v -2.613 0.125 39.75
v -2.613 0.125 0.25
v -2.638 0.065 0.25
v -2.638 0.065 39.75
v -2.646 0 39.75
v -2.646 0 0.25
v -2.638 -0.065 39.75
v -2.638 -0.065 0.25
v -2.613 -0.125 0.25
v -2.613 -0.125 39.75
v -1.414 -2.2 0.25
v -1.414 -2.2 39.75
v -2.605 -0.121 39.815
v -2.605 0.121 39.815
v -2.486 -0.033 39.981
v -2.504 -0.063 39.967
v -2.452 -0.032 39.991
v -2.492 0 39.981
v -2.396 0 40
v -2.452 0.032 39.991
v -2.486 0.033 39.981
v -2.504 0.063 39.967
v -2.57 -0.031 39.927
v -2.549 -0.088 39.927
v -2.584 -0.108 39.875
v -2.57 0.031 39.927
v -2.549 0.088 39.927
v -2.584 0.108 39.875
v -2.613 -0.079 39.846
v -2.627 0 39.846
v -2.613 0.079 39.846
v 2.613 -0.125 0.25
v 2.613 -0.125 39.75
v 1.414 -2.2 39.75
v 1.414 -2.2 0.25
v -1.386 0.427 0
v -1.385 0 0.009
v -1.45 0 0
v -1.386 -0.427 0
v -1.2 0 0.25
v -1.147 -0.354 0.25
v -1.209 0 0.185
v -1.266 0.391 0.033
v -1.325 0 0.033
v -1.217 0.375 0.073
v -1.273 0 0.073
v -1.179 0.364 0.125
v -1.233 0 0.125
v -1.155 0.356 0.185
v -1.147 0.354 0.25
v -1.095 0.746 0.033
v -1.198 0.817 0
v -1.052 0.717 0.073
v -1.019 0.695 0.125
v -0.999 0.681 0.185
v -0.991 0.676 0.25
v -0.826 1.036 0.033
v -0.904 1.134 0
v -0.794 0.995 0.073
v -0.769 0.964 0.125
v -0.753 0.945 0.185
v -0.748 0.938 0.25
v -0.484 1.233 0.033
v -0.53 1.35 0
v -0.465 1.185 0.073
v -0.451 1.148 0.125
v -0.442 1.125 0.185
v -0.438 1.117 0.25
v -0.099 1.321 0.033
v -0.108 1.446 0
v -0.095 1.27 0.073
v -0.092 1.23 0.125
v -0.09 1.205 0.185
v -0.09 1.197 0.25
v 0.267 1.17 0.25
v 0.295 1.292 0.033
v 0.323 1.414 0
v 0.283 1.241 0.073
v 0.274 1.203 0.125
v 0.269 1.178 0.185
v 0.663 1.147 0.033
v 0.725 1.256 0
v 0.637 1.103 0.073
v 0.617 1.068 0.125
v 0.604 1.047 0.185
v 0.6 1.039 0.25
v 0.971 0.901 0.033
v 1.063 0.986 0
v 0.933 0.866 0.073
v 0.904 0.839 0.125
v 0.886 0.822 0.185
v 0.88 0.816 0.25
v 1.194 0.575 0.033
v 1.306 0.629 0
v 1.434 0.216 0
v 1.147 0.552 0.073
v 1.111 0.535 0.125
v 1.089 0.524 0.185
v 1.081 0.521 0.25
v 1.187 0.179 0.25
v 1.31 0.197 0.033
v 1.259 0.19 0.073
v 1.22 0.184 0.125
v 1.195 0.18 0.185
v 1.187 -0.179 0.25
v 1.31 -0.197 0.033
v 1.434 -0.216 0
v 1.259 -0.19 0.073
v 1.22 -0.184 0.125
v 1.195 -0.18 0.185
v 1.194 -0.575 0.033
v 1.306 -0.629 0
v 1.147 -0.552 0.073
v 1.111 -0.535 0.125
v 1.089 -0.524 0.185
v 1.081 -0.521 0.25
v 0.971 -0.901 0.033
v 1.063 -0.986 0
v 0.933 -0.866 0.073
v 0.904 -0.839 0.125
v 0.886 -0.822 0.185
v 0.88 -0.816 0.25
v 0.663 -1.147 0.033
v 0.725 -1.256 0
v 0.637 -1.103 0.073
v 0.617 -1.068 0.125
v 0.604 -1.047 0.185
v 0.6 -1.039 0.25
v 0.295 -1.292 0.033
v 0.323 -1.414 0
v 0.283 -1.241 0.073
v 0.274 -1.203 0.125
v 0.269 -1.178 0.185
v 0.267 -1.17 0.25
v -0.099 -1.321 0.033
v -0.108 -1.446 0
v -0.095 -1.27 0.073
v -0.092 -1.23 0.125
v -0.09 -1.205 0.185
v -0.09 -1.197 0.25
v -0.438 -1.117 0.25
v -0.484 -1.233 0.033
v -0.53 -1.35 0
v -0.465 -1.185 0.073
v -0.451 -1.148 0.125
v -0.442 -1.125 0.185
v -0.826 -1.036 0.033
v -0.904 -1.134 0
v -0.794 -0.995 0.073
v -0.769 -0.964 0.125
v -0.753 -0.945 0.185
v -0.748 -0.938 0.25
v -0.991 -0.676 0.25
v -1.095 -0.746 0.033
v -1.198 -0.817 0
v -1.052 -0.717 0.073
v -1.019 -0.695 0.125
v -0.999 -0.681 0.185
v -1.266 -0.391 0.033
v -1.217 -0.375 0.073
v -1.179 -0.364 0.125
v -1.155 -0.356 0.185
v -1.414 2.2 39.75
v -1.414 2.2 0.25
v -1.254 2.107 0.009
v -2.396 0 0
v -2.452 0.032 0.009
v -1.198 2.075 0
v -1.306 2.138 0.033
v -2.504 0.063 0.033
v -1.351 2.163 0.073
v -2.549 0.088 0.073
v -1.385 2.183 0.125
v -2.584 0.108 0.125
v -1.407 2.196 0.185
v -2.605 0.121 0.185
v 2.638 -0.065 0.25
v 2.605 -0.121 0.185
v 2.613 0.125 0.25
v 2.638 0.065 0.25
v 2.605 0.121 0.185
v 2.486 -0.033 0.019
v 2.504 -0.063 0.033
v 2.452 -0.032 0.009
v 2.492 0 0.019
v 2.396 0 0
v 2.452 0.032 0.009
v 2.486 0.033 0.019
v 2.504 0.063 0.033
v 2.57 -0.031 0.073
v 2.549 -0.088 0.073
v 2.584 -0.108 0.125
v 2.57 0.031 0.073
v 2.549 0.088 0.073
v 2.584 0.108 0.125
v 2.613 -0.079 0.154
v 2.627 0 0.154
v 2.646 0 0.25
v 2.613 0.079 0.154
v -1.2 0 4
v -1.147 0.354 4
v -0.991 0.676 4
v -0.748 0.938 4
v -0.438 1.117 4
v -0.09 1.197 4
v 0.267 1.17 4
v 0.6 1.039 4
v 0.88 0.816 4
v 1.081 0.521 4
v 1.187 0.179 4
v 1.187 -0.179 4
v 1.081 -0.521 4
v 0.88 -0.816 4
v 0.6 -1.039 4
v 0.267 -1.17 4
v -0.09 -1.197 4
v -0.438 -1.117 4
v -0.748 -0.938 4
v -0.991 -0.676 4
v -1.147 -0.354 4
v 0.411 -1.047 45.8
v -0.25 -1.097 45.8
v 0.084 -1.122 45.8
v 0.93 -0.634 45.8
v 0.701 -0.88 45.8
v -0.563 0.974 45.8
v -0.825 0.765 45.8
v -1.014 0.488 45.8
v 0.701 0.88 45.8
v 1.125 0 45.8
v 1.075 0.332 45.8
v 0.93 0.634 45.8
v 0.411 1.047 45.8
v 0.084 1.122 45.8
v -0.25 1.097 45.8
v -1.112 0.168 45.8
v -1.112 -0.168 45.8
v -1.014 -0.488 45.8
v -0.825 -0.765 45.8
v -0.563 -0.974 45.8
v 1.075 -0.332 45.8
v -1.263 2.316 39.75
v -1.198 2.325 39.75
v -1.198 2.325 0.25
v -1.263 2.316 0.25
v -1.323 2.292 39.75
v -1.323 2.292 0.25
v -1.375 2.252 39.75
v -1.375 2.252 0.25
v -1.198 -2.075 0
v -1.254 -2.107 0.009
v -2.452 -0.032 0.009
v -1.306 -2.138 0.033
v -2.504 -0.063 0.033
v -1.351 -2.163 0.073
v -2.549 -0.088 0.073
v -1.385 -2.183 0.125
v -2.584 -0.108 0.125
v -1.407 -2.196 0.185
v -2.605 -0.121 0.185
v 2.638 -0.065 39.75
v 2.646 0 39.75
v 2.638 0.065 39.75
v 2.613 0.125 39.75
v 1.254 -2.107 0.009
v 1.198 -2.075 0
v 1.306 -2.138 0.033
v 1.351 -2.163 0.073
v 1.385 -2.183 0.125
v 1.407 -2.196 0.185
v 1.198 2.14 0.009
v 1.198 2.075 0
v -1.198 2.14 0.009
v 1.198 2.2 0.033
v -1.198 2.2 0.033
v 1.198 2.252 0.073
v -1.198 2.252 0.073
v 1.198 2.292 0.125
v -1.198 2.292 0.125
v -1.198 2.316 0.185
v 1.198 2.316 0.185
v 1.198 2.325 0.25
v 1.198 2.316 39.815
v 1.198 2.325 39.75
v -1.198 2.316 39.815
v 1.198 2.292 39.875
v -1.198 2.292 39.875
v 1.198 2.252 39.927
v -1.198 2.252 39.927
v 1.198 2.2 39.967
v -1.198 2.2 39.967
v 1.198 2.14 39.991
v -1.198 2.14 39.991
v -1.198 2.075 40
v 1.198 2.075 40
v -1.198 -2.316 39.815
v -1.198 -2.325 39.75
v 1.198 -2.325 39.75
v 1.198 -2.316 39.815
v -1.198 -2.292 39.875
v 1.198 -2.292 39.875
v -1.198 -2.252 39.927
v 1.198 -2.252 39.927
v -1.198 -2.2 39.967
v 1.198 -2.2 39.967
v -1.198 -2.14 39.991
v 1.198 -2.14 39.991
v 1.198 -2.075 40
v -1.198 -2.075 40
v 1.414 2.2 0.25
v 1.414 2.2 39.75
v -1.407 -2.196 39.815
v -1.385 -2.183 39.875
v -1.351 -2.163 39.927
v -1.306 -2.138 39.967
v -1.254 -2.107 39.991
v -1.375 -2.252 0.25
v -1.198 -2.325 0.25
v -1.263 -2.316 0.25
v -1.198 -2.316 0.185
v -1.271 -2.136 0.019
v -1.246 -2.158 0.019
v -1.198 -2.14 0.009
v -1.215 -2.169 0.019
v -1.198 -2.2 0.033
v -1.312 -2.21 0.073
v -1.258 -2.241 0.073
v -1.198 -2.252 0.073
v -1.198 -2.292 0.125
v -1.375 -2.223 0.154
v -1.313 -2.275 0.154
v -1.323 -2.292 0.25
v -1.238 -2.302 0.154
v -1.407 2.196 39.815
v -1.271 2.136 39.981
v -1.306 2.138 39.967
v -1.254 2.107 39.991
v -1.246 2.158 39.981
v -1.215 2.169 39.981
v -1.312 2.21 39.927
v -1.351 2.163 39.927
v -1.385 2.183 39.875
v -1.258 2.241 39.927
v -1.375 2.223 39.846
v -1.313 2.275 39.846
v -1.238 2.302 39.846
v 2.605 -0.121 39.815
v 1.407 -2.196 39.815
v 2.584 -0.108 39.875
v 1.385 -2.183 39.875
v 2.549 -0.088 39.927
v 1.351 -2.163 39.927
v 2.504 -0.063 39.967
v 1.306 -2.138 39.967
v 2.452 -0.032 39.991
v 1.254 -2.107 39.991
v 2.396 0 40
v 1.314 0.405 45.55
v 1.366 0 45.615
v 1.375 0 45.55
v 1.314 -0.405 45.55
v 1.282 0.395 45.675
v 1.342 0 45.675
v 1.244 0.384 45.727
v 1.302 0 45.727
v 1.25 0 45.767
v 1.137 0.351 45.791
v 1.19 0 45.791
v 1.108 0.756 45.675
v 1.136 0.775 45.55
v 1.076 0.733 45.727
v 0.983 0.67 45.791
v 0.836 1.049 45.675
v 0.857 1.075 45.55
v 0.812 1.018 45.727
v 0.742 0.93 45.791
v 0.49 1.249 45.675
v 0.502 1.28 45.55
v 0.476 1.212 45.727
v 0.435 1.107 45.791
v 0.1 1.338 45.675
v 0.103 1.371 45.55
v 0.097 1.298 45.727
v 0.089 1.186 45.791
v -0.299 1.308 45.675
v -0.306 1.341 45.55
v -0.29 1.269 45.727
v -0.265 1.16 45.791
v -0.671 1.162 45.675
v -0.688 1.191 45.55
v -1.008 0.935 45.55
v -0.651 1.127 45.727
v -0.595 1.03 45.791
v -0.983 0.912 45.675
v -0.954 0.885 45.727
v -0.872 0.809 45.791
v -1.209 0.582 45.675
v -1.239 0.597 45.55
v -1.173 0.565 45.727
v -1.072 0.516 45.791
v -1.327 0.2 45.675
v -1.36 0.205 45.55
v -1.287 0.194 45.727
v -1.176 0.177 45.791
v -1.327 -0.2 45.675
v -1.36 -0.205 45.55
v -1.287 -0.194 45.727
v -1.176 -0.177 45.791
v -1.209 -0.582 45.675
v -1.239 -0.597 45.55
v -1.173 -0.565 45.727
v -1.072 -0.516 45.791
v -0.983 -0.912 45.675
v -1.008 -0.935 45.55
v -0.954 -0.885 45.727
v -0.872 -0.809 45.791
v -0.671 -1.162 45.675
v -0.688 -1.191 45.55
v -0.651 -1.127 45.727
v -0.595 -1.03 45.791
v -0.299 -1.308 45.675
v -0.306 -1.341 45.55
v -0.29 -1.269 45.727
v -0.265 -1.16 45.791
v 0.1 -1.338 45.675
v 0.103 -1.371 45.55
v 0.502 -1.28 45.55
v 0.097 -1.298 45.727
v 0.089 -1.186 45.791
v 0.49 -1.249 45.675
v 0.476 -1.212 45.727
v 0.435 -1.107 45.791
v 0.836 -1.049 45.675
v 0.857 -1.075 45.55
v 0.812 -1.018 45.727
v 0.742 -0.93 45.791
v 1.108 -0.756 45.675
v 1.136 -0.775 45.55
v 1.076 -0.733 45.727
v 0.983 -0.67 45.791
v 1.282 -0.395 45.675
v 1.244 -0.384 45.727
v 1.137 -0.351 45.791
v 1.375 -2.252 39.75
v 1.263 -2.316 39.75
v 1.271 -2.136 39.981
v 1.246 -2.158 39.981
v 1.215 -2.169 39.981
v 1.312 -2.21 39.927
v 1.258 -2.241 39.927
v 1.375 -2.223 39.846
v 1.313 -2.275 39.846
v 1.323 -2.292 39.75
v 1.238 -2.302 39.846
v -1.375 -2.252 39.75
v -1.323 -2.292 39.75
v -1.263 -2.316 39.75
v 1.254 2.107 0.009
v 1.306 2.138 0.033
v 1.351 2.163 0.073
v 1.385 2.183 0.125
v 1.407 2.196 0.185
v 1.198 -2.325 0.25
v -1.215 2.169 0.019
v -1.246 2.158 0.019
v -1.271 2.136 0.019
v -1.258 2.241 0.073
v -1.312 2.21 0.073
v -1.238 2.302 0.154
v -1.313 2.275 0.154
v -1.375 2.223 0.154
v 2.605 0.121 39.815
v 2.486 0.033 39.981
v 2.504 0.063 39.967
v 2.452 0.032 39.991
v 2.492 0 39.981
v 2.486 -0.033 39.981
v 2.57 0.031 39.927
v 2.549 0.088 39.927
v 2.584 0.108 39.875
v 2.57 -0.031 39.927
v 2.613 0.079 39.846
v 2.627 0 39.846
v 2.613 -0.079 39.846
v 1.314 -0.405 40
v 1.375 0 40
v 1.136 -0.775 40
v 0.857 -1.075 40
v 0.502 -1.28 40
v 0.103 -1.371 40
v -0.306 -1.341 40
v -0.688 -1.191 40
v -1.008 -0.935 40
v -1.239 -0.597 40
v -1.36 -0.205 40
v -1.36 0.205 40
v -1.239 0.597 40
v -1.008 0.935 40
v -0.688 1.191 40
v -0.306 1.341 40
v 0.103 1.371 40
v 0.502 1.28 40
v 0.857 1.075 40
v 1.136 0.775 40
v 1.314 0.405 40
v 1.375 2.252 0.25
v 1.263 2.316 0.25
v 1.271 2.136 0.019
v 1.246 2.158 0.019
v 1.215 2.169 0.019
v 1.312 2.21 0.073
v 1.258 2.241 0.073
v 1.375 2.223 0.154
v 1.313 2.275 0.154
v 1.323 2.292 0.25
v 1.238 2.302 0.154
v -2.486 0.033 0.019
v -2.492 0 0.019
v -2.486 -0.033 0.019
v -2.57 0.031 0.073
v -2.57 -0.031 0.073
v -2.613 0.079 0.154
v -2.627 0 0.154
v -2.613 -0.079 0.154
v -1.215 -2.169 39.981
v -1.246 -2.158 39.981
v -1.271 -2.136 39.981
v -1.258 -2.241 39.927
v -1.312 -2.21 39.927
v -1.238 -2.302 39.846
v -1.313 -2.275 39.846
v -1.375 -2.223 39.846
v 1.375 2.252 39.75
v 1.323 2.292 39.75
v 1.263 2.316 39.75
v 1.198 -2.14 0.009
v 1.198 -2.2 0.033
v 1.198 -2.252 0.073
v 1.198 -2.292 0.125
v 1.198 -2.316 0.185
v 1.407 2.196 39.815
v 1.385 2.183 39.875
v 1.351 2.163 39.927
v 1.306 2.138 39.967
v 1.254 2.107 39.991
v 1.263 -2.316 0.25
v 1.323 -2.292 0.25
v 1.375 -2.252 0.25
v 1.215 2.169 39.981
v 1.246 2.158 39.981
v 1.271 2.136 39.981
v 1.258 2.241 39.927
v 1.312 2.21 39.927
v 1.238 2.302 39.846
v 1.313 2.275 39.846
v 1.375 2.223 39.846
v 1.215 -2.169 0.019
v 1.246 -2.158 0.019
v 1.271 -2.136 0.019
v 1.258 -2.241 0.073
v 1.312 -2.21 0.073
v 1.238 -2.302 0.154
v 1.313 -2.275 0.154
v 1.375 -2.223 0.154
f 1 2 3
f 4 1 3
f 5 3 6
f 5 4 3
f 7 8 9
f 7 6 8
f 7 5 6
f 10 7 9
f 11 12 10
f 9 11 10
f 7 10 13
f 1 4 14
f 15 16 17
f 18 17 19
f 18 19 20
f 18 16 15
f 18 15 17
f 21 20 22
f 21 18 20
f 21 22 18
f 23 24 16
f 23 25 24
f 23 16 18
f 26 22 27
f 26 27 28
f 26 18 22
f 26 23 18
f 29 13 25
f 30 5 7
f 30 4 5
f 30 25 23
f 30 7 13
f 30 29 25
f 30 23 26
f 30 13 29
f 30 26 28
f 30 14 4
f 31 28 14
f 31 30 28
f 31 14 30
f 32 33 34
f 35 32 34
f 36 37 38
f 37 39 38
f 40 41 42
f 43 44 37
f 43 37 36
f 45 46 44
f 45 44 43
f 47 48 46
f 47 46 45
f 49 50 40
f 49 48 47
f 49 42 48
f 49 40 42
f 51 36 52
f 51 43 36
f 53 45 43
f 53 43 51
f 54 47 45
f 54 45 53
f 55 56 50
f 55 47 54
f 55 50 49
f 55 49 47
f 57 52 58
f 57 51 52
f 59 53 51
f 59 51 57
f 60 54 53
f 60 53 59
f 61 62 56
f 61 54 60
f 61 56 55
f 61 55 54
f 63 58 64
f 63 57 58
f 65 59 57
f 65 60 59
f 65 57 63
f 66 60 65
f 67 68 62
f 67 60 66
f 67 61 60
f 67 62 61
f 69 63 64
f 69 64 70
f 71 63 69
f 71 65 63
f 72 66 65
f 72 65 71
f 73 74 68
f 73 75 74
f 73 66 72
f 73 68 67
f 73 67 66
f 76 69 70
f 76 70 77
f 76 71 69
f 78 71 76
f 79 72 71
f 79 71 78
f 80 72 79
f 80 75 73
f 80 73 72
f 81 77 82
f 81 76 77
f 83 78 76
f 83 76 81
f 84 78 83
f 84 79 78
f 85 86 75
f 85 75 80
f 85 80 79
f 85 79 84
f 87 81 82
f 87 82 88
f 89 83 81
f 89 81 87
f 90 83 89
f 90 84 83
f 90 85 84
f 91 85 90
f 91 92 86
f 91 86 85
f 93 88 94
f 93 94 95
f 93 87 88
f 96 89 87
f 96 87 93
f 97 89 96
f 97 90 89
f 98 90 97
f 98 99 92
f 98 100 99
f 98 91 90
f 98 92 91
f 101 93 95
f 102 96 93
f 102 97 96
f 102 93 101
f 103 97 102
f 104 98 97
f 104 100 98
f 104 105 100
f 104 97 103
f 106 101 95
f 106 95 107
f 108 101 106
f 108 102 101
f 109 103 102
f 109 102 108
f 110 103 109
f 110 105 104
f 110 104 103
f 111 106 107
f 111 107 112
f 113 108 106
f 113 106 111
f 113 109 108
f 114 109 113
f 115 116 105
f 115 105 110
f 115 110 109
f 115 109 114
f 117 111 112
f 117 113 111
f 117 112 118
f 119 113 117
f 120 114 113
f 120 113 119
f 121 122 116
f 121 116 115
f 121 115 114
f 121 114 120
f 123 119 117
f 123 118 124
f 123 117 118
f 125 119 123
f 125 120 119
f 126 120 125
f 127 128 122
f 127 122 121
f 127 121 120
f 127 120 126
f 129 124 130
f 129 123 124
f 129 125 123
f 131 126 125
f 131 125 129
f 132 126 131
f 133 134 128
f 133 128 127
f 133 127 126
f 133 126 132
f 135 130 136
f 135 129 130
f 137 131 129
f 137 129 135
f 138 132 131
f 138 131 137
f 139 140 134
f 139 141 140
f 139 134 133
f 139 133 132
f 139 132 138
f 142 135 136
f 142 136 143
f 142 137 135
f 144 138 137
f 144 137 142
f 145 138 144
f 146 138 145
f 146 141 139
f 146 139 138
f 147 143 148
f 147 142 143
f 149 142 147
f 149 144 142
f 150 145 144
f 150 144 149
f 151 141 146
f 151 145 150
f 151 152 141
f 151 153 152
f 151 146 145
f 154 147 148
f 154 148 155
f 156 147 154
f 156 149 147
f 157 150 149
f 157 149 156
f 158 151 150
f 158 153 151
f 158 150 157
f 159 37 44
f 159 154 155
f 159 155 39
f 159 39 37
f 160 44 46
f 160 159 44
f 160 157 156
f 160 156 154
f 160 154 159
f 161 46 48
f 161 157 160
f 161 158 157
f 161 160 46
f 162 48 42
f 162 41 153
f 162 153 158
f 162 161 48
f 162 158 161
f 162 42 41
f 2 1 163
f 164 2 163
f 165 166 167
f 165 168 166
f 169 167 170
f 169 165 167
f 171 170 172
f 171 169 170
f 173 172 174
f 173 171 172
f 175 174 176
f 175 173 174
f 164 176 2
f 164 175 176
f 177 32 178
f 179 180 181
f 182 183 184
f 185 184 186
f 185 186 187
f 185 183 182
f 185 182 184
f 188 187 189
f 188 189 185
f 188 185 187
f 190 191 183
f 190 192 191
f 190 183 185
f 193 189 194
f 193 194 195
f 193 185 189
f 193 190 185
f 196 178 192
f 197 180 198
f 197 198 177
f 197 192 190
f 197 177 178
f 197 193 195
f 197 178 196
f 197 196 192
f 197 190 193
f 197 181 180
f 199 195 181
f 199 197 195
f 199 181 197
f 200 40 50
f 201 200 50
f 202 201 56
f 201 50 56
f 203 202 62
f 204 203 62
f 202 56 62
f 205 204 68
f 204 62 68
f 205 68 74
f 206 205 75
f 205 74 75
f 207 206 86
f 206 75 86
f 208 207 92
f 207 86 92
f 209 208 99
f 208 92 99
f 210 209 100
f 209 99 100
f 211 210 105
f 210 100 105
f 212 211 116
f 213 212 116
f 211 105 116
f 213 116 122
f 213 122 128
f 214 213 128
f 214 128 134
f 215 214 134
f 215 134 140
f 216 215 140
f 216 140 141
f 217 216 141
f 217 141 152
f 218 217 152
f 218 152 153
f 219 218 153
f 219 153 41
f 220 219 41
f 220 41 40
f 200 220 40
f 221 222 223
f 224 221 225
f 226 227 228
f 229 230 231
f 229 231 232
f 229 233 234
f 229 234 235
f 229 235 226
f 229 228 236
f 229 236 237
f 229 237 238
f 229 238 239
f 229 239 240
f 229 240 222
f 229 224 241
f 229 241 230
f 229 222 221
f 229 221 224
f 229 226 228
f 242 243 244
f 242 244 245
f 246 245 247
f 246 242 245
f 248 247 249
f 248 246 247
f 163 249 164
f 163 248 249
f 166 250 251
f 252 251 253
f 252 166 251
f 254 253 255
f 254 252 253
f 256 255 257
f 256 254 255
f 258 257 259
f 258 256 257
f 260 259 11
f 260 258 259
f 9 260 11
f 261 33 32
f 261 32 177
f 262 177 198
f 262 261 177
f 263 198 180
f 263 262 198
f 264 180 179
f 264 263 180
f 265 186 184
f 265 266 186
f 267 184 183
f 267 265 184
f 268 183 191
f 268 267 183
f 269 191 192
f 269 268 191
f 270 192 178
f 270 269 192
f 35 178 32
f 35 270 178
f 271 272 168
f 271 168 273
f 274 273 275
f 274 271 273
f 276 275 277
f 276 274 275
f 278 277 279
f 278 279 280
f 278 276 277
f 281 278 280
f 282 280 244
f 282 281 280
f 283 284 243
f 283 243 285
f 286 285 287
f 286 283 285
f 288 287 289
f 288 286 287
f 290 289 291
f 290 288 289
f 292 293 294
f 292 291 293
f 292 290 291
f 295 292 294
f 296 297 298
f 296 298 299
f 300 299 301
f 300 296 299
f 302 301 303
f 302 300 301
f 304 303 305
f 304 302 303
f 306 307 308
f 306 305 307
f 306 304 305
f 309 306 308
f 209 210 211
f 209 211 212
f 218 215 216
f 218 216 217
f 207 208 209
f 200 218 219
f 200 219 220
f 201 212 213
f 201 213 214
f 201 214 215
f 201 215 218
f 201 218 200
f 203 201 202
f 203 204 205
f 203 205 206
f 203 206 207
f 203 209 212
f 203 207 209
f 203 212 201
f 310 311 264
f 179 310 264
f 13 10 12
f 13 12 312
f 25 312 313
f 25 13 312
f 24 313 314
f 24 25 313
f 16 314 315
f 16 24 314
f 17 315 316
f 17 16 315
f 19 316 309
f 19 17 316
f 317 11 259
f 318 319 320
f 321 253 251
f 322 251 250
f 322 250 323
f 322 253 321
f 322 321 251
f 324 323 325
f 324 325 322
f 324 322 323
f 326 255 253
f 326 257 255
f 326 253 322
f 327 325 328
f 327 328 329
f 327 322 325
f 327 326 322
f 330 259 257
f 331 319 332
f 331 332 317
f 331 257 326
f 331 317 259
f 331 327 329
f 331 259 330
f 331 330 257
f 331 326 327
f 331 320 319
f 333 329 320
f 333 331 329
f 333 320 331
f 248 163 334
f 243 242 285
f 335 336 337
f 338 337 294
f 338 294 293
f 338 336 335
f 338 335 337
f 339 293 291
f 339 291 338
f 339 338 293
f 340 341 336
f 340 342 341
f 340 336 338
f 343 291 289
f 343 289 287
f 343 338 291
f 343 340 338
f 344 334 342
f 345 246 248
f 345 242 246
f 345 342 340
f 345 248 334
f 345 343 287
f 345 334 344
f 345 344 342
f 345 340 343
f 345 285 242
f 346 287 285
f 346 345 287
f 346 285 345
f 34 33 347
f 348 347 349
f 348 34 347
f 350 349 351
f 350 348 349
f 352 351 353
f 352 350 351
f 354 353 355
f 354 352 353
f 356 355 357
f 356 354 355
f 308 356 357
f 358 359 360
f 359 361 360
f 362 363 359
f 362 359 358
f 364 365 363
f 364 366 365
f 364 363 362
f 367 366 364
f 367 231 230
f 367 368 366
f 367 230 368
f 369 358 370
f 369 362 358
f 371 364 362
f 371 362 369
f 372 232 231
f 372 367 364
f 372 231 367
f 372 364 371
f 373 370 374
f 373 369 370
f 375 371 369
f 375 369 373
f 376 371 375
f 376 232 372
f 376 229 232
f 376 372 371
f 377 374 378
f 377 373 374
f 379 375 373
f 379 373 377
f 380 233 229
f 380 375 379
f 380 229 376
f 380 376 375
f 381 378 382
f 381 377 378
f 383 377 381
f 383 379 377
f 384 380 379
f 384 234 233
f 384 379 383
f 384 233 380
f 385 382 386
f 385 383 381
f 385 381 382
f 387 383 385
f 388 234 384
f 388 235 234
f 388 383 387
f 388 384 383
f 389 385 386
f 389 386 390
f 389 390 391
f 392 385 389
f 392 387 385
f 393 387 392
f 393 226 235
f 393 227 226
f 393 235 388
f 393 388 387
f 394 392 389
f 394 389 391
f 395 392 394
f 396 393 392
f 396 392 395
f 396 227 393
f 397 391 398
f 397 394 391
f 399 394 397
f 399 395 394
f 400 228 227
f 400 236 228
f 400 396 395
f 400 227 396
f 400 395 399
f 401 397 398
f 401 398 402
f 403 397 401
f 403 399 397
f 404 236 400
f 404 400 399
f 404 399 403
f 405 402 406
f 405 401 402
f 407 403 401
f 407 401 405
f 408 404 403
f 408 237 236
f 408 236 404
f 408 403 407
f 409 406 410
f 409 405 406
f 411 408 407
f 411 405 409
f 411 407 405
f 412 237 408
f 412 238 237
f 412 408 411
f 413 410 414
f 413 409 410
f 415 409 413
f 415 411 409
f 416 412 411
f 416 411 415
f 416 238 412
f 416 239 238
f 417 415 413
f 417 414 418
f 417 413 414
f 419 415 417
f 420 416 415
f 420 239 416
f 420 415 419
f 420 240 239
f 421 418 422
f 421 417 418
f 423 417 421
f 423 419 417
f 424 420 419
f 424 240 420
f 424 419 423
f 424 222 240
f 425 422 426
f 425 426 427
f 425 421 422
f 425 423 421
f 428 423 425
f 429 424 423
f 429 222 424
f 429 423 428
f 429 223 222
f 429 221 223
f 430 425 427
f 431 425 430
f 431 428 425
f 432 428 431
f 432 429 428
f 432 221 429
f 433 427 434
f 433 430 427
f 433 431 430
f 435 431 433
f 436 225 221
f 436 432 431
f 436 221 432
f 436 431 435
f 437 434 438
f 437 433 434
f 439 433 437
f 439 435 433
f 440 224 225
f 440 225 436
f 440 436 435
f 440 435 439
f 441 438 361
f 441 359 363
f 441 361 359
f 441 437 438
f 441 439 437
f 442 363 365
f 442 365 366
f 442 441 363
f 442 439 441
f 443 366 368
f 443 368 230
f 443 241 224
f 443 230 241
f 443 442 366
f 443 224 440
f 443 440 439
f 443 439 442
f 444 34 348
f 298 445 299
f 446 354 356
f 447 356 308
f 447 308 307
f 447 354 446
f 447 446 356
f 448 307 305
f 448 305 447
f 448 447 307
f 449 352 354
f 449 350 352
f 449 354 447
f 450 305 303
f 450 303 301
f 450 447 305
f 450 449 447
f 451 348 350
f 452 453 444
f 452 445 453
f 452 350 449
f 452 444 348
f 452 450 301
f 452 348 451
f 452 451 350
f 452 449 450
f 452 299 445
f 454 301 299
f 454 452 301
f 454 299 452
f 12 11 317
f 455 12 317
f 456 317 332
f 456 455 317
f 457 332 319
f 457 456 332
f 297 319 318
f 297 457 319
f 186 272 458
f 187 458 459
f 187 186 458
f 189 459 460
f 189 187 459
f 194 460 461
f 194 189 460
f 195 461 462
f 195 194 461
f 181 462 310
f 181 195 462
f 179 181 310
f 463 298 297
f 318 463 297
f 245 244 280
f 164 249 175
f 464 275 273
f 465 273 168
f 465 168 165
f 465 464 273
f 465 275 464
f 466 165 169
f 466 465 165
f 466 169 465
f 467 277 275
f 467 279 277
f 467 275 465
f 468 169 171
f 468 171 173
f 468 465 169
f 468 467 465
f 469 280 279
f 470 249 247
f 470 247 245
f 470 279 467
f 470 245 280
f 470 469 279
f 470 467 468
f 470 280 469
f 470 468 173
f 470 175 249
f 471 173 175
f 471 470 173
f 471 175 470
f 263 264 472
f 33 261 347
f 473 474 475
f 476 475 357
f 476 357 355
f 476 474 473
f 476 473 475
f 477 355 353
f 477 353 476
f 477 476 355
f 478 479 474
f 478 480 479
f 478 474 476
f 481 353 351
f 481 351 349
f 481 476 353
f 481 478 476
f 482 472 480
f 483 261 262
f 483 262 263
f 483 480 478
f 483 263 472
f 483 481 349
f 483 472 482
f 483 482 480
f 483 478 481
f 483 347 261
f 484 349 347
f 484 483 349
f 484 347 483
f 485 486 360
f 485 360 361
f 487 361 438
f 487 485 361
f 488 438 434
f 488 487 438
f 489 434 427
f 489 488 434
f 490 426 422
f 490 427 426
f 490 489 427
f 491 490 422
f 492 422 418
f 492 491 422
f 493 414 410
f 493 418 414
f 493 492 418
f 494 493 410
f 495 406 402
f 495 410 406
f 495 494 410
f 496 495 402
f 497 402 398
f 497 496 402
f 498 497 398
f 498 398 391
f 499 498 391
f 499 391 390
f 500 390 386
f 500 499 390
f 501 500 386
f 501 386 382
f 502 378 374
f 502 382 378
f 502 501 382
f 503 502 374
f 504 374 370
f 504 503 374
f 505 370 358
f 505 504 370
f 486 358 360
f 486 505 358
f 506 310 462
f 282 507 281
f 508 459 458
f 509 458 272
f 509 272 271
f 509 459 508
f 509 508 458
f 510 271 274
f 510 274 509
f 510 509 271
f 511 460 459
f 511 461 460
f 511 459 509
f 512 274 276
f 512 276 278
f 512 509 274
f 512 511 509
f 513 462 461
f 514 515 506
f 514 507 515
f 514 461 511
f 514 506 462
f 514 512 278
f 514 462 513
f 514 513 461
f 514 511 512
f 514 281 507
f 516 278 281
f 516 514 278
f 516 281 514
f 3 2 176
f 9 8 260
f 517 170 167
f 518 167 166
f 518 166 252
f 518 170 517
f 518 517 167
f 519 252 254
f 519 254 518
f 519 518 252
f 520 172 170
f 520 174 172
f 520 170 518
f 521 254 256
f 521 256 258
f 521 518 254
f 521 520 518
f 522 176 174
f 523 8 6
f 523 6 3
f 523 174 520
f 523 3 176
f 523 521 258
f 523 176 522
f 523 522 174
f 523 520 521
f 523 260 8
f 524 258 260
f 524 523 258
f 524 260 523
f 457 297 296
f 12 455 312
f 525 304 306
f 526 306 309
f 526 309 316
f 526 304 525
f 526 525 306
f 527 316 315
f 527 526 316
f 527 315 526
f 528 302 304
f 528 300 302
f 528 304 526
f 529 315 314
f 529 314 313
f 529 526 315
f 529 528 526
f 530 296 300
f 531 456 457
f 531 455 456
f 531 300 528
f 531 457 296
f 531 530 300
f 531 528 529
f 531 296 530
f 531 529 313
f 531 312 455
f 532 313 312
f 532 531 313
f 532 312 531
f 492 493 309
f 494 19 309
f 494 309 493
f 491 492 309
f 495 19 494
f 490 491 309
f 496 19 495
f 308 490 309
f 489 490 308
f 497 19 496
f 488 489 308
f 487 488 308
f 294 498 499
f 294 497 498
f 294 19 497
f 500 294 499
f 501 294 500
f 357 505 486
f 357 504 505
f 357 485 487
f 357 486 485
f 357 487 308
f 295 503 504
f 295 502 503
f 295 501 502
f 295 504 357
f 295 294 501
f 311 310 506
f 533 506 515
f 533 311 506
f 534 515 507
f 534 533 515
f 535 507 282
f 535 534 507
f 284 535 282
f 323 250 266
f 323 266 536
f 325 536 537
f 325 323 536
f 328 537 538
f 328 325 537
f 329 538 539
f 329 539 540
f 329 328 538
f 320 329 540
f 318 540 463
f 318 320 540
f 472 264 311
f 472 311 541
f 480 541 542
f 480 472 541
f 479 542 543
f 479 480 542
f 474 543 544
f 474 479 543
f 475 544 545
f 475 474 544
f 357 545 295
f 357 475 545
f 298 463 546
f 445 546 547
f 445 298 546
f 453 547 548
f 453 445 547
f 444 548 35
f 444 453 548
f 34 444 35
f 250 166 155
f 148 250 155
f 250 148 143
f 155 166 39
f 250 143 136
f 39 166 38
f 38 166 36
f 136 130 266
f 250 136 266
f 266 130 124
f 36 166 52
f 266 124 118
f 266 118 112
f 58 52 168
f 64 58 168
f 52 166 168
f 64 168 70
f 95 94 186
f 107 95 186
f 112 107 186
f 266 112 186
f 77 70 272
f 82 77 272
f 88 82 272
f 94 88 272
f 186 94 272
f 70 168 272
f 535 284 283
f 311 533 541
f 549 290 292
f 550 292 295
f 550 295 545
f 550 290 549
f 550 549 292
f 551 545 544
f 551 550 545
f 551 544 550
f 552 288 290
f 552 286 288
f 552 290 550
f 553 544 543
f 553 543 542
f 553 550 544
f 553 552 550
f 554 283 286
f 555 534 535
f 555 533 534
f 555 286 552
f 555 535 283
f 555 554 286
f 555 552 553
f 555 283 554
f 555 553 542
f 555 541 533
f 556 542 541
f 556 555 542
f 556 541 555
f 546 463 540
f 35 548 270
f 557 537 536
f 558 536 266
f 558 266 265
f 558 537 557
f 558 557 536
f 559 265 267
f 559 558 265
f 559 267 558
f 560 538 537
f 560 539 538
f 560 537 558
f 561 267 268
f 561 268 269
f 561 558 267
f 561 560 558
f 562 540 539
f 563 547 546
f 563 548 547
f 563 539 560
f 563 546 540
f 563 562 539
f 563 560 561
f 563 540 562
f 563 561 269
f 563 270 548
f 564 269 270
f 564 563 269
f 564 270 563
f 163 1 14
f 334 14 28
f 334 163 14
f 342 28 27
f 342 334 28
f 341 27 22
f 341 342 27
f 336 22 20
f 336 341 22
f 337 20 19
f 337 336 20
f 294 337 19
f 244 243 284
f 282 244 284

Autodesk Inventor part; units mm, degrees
ref_plane "YZ Plane" through (0, 0, 0) normal (1, 0, 0) x (0, 1, 0)
ref_plane "XZ Plane" through (0, 0, 0) normal (0, 1, 0) x (-1, 0, 0)
ref_plane "XY Plane" through (0, 0, 0) normal (0, 0, 1) x (1, 0, 0)
sketch "Boceto1" plane through (0, 0, 0) normal (0, 0, 1) x (1, 0, 0)
  line L0 (1.3423, 2.325) -> (2.6847, 0)
  line L1 (2.6847, 0) -> (1.3423, -2.325)
  line L2 (1.3423, -2.325) -> (-1.3423, -2.325)
  line L3 (-1.3423, -2.325) -> (-2.6847, 0)
  line L4 (-2.6847, 0) -> (-1.3423, 2.325)
  line L5 (-1.3423, 2.325) -> (1.3423, 2.325)
  point P0 (0, 0)
  point P1 (0, 0)
  point P2 (0, 0)
  dimension "d0" = 4.65
extrude "Extrusión1" add sketch "Boceto1" along normal blind 40
sketch "Boceto2" plane through (0, 0, 40) normal (0, 0, 1) x (1, 0, 0)
  circle A0 centre (0, 0) radius 1.375
  dimension "d3" = 2.75
extrude "Extrusión2" add sketch "Boceto2" along normal blind 5.8
fillet "Empalme1" radius 0.25 1 edges at (-1.375, 0, 45.8)
fillet "Empalme2" radius 0.25 18 edges at (-1.3423, 2.325, 20) (-2.6847, 0, 20) (1.3423, 2.325, 20) (2.6847, 0, 20) (1.3423, -2.325, 20) (-1.3423, -2.325, 20) (0, -2.325, 0) (-2.0135, -1.1625, 0) (-2.0135, 1.1625, 0) (2.0135, 1.1625, 0) (2.0135, -1.1625, 0) (0, 2.325, 0) (2.0135, -1.1625, 40) (0, -2.325, 40) (-2.0135, -1.1625, 40) (-2.0135, 1.1625, 40) (0, 2.325, 40) (2.0135, 1.1625, 40)
sketch "Boceto3" plane through (0, 0, 0) normal (0, 0, -1) x (-1, 0, 0)
  circle A0 centre (0, 0) radius 1.2
  dimension "d8" = 2.4
extrude "Extrusión3" cut sketch "Boceto3" against normal blind 4
fillet "Empalme3" radius 0.25 1 edges at (1.2, 0, 0)
properties part number "Espaciador_40mm"
